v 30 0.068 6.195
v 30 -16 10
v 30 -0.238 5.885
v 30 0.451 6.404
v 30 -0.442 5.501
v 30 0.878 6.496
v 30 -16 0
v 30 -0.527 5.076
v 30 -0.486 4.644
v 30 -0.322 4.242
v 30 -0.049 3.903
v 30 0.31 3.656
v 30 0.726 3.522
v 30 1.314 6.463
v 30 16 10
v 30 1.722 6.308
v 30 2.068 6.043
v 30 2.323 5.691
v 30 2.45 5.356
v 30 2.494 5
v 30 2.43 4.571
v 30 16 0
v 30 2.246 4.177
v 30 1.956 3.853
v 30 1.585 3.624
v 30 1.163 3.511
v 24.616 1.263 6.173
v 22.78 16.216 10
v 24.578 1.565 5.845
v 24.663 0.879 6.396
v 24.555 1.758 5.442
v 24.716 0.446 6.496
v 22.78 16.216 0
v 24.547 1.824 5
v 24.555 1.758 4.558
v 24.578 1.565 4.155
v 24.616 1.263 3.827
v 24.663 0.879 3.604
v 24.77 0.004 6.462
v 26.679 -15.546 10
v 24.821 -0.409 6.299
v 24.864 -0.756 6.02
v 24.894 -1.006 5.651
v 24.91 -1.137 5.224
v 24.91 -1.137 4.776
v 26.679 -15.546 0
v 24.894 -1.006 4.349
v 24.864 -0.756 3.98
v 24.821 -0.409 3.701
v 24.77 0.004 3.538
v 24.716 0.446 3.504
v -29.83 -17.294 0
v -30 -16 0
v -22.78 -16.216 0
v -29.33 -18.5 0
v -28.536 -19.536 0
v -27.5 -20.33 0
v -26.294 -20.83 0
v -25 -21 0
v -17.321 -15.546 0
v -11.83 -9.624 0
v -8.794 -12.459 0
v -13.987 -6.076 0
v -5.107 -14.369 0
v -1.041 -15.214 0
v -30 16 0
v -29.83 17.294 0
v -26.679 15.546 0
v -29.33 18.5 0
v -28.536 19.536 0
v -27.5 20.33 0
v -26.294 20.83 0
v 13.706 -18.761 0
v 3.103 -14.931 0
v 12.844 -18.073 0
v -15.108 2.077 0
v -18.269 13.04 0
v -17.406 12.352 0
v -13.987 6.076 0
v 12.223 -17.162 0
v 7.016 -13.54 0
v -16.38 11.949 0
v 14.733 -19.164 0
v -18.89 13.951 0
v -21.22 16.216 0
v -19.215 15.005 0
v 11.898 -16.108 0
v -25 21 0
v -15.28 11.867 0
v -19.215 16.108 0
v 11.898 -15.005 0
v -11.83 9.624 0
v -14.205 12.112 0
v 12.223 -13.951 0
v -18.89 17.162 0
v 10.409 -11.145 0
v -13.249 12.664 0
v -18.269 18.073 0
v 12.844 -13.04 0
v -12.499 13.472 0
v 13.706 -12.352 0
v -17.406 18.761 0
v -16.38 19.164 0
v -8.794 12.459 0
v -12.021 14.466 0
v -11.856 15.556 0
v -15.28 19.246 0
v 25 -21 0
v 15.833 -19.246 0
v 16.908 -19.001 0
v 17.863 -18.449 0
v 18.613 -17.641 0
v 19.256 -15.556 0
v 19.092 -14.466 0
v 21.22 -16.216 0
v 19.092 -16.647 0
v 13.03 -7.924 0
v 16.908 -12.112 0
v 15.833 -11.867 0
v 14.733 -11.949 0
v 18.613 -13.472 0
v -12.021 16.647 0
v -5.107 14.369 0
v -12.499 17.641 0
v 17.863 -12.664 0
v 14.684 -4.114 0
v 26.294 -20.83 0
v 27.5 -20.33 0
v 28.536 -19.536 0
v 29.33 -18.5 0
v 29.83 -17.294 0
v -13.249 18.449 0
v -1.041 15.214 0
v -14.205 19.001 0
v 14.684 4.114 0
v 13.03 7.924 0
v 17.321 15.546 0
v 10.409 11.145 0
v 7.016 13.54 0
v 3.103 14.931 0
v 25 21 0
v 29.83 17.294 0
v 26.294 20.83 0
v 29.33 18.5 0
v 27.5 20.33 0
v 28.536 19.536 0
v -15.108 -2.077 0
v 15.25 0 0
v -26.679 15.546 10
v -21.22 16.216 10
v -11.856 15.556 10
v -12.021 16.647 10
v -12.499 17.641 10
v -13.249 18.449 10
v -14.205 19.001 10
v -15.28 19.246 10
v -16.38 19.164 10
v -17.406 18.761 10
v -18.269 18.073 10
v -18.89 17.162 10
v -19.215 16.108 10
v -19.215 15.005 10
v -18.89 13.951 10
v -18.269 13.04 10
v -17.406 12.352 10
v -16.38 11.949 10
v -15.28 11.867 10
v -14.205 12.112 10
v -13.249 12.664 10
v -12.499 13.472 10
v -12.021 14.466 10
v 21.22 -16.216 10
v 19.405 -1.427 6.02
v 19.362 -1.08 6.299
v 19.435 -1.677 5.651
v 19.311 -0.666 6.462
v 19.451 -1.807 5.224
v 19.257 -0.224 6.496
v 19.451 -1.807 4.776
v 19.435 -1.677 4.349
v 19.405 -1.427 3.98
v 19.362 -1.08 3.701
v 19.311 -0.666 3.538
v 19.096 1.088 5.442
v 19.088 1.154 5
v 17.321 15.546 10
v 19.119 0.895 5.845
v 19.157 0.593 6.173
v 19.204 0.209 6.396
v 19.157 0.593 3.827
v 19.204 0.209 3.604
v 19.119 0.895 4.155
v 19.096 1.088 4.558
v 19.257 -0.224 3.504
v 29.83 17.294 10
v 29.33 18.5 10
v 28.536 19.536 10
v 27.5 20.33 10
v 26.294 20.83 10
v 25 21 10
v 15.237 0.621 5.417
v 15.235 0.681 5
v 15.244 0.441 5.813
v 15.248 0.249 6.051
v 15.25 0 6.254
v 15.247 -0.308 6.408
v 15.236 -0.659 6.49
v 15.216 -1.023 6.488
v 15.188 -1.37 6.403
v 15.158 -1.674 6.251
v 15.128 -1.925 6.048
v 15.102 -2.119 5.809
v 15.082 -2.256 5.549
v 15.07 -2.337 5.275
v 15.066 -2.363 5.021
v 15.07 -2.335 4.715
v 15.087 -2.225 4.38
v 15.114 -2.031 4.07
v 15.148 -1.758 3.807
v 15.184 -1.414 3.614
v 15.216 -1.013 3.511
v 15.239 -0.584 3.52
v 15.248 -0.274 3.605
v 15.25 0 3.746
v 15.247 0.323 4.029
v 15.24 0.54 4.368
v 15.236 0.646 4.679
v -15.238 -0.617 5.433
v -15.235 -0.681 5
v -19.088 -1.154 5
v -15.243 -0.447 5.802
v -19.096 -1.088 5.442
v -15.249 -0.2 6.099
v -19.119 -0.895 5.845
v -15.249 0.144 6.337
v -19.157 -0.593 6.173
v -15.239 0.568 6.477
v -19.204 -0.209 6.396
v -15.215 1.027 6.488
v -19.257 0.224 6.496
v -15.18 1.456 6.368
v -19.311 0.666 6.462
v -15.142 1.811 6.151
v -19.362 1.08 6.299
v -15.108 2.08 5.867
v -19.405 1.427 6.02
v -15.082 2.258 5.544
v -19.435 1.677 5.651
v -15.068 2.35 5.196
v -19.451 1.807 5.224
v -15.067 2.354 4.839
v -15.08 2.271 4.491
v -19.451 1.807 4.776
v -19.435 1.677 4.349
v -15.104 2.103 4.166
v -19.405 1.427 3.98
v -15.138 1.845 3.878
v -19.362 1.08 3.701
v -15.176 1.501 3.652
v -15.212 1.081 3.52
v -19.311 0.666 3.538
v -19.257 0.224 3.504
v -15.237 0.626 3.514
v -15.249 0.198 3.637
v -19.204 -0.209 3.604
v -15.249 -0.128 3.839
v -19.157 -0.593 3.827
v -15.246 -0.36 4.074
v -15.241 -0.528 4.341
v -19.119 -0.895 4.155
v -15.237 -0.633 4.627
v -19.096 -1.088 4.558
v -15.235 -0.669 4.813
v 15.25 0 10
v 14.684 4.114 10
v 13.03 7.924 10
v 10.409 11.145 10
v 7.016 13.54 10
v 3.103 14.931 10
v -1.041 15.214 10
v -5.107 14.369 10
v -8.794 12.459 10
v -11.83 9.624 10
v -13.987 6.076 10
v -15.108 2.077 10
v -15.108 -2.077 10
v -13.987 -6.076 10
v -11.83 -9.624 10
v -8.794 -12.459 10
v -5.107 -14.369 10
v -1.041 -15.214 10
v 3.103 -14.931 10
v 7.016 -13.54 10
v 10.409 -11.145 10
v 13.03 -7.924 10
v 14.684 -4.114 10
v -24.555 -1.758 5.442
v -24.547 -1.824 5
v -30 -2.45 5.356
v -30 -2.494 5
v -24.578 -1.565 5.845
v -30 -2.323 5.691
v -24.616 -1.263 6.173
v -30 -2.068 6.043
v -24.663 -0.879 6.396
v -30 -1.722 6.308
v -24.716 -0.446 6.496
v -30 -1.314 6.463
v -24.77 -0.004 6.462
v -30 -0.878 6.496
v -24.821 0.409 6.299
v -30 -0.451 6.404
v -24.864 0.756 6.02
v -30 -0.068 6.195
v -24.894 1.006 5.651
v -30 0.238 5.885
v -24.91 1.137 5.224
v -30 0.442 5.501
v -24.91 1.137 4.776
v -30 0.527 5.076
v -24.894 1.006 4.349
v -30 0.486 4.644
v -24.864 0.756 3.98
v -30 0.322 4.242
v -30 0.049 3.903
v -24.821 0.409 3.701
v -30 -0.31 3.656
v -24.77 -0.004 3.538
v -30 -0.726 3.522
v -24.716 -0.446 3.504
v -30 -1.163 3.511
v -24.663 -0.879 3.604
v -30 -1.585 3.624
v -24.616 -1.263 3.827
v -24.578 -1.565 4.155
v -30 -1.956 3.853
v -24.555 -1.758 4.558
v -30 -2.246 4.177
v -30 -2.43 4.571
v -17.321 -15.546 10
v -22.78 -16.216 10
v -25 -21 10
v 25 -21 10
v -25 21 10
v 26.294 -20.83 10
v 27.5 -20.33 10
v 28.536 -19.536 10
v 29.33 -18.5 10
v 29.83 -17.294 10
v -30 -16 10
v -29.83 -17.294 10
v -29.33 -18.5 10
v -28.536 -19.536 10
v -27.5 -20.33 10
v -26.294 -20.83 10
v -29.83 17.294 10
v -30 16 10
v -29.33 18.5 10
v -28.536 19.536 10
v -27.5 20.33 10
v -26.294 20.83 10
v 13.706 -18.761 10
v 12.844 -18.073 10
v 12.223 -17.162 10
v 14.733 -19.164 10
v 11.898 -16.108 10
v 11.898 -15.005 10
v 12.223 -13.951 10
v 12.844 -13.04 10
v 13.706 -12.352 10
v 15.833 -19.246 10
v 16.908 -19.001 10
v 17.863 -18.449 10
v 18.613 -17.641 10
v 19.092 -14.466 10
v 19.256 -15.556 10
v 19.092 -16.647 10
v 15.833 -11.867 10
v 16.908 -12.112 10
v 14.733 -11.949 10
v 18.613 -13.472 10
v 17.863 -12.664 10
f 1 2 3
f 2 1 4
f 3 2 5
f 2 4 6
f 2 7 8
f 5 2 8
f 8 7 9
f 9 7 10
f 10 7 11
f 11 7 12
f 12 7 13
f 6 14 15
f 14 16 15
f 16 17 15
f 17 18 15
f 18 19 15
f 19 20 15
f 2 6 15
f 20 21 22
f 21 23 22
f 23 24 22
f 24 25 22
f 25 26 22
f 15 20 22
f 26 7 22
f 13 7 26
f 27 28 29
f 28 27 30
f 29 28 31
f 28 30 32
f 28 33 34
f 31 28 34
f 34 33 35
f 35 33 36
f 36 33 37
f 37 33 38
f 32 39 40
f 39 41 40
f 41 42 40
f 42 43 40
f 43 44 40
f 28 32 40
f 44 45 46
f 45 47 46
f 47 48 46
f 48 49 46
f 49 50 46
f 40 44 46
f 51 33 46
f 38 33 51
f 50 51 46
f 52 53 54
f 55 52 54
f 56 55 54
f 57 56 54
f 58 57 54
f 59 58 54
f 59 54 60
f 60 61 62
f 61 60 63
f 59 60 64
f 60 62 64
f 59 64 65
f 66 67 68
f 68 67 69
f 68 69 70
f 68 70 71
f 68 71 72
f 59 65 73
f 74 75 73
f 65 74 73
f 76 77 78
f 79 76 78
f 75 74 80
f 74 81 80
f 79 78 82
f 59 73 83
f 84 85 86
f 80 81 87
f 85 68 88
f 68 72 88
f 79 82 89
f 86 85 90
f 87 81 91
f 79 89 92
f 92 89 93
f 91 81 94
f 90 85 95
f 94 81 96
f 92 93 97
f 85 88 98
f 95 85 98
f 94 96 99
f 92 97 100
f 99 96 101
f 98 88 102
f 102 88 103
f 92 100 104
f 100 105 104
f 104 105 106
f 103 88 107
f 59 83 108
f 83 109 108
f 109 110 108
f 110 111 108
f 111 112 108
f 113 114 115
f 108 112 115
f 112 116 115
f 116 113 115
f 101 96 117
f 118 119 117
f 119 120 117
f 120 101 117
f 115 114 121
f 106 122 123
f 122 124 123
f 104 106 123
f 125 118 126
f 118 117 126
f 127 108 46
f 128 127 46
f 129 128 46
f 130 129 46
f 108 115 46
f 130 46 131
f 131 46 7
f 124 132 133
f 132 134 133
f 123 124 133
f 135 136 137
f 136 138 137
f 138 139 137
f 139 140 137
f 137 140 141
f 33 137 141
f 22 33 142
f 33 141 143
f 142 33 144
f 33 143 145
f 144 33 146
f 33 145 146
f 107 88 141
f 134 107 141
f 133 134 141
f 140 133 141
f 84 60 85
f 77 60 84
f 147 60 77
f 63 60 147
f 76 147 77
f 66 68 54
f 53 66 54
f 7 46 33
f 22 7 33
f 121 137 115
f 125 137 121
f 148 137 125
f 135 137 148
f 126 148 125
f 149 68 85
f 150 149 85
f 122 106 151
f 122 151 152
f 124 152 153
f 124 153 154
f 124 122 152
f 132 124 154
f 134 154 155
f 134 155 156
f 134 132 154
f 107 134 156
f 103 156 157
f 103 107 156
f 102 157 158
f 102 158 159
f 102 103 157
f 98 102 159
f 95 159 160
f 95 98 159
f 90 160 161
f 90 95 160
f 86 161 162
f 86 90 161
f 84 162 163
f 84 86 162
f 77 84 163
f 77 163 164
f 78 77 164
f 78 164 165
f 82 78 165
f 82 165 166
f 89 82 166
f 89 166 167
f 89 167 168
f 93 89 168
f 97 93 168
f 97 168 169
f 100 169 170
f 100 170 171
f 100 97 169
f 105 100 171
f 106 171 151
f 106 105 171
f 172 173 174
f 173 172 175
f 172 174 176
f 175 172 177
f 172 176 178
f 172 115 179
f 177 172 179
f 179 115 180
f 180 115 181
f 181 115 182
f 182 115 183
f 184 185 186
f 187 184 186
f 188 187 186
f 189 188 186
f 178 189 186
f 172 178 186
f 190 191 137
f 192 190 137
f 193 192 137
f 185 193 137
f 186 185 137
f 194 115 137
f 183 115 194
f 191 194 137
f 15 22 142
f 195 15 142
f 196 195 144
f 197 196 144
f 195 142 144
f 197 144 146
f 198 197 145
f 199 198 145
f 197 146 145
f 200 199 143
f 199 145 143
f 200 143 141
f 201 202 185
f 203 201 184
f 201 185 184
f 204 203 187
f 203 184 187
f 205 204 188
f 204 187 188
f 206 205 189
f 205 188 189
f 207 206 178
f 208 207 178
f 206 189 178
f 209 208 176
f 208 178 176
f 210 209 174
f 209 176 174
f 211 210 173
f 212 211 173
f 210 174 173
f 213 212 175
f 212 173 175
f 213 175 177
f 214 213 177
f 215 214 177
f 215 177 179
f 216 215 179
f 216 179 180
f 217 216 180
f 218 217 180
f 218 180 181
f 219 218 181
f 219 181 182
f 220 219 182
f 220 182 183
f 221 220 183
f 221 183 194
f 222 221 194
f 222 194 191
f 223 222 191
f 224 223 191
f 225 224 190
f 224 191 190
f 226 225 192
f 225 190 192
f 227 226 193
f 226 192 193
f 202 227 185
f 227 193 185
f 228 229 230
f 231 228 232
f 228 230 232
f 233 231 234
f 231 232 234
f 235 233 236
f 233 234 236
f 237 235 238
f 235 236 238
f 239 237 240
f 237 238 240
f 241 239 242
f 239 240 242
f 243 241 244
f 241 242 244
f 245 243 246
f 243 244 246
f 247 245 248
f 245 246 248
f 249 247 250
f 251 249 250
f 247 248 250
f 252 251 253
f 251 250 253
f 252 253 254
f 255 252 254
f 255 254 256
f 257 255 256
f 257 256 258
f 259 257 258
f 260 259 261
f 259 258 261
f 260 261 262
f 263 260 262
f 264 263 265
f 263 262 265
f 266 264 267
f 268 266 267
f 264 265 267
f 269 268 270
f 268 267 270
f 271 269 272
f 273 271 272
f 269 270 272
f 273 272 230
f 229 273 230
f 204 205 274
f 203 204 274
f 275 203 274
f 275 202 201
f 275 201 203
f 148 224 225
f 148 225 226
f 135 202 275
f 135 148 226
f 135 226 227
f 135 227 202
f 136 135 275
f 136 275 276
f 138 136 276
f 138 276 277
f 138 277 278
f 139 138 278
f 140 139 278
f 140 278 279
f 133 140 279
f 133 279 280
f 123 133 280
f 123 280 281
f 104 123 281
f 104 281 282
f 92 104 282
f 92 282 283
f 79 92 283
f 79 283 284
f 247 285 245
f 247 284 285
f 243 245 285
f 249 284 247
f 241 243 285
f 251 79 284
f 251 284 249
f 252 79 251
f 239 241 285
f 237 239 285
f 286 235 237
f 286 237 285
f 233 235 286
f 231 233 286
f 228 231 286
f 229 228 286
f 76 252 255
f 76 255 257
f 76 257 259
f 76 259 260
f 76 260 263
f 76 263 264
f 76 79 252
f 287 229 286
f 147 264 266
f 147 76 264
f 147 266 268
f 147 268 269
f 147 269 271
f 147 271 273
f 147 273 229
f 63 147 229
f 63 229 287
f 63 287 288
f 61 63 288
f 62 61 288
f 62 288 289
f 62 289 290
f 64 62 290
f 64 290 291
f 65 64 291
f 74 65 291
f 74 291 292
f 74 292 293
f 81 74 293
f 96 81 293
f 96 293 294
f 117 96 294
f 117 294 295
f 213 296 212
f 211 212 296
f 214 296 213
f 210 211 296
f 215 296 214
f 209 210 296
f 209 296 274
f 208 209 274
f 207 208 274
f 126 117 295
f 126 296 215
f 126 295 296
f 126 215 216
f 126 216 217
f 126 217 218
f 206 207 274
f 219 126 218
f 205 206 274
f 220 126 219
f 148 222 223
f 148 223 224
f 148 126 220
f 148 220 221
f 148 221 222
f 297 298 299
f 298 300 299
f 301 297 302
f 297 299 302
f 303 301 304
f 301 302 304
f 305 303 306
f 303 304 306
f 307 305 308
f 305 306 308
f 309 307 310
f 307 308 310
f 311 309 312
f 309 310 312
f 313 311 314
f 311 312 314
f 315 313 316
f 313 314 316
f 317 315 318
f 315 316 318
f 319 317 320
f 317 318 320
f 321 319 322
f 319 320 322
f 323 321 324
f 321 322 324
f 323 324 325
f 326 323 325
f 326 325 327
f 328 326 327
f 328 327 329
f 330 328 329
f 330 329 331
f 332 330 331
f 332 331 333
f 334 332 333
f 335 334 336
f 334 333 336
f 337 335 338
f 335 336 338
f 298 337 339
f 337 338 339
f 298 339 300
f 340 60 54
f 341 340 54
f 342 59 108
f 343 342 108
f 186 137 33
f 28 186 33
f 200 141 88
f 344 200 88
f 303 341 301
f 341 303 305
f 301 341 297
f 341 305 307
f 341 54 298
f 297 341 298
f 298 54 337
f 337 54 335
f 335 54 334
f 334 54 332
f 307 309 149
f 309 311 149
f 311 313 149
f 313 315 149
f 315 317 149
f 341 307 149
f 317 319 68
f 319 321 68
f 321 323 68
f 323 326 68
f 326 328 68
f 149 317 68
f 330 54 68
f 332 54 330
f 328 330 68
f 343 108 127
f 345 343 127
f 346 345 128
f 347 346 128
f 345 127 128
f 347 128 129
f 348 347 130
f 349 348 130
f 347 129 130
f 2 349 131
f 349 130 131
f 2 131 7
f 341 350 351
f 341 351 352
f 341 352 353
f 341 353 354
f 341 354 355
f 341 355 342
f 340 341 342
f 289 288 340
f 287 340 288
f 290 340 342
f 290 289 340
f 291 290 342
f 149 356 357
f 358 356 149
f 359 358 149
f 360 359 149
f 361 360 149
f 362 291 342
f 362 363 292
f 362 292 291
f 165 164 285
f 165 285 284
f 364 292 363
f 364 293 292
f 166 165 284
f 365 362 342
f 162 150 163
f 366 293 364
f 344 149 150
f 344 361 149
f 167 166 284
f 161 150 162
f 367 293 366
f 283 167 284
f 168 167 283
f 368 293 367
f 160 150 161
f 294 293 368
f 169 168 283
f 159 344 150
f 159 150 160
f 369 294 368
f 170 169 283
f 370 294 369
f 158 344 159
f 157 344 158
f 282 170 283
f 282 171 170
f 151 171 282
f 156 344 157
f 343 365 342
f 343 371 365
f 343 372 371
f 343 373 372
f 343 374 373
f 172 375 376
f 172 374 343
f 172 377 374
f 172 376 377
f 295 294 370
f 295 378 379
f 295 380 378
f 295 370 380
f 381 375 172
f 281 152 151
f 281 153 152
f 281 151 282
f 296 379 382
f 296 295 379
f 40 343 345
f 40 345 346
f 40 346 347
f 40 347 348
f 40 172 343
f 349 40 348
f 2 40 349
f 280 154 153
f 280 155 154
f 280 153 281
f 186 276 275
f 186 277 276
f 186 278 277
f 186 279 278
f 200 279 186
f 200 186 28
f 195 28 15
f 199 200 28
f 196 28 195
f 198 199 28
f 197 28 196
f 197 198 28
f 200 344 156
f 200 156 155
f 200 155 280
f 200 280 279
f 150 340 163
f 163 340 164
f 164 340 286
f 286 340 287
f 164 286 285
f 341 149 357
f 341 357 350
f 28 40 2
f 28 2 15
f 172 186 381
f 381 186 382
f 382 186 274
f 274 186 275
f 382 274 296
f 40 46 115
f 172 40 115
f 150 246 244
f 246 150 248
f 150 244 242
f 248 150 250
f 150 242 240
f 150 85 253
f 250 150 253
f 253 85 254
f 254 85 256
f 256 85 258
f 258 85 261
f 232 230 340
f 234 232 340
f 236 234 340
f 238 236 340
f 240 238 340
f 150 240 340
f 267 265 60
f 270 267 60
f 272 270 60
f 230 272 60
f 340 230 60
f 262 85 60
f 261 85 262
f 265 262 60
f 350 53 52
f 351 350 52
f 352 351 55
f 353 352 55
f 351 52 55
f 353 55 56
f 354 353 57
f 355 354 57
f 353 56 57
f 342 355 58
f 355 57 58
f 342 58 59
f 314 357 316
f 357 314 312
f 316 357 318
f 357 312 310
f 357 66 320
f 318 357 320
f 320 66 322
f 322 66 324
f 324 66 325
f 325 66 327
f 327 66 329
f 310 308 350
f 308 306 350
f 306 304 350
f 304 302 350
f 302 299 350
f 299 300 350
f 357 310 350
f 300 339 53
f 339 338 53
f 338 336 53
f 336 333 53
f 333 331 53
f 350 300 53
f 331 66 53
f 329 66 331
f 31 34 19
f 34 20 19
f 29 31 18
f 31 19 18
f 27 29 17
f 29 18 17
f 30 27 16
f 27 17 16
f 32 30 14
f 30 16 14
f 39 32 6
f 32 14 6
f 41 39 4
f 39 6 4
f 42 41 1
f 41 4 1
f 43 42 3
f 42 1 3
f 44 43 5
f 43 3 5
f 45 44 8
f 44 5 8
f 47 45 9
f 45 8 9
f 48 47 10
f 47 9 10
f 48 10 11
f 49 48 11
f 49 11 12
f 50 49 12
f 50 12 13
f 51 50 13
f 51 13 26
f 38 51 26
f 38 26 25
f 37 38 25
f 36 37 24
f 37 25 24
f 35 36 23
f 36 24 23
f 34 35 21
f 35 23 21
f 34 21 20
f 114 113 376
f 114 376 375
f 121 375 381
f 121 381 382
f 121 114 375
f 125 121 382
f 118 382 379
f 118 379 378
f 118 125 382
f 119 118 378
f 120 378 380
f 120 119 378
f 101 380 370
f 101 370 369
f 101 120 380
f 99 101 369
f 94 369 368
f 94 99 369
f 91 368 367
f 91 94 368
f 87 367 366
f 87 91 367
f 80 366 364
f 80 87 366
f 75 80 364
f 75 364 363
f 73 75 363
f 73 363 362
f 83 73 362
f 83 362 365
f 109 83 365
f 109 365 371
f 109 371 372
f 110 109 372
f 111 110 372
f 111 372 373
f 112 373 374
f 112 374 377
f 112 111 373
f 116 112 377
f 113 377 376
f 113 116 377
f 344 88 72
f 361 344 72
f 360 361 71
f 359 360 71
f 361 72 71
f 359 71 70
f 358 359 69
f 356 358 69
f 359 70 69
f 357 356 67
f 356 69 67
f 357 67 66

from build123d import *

# Parameters (mm, degrees)
F0_R     = 3.7
F0_R_2   = 15.25
F1_DEPTH = 10
F2_R     = 1.5
F3_DEPTH = 12.5
F4_R     = 1.5
F5_DEPTH = 12.5


with BuildPart() as f1:
    # F0 (on Top) → F1 (new body)
    with BuildSketch(Plane.XY):
        with BuildLine():
            Line((25, 21), (0, 21))
            Line((0, 21), (-25, 21))
            ThreePointArc((-25, 21), (-28.5355339059, 19.5355339059), (-30, 16))
            Line((-30, 16), (-30, 0))
            Line((-30, 0), (-30, -16))
            ThreePointArc((-30, -16), (-28.5355339059, -19.5355339059), (-25, -21))
            Line((-25, -21), (0, -21))
            Line((0, -21), (25, -21))
            ThreePointArc((25, -21), (28.5355339059, -19.5355339059), (30, -16))
            Line((30, -16), (30, 0))
            Line((30, 0), (30, 16))
            ThreePointArc((30, 16), (28.5355339059, 19.5355339059), (25, 21))
        make_face()
        with Locations((15.5563491861, -15.5563491861)):
            Circle(F0_R, mode=Mode.SUBTRACT)
        Polygon((22.7795924225, 16.2158791206), (24.729501917, 0.3351406944), (26.6794114115, -15.5455977319), (21.2204075775, -16.2158791206), (17.3205885885, 15.5455977319), align=None, mode=Mode.SUBTRACT)
        Polygon((-21.2204075775, 16.2158791206), (-19.270498083, 0.3351406944), (-17.3205885885, -15.5455977319), (-22.7795924225, -16.2158791206), (-24.729501917, -0.3351406944), (-26.6794114115, 15.5455977319), align=None, mode=Mode.SUBTRACT)
        with Locations((-15.5563491861, 15.5563491861)):
            Circle(F0_R, mode=Mode.SUBTRACT)
        Circle(F0_R_2, mode=Mode.SUBTRACT)
    extrude(amount=F1_DEPTH)

    # F2 (on face) → F3 (cut, symmetric)
    with BuildSketch(Plane(origin=(-18.943751072, -2.3260001572, 0), x_dir=(0.1218693434, -0.9925461516, 0), z_dir=(-0.9925461516, -0.1218693434, 0))):
        with Locations((-2.6811255549, 5)):
            Circle(F2_R)
    extrude(amount=F3_DEPTH, both=True, mode=Mode.SUBTRACT)

    # F4 (on face) → F5 (cut, symmetric)
    with BuildSketch(Plane(origin=(18.943751072, 2.3260001572, 0), x_dir=(-0.1218693434, 0.9925461516, 0), z_dir=(0.9925461516, 0.1218693434, 0))):
        with Locations((-2.6811255549, 5)):
            Circle(F4_R)
    extrude(amount=F5_DEPTH, both=True, mode=Mode.SUBTRACT)


solid = f1.part
